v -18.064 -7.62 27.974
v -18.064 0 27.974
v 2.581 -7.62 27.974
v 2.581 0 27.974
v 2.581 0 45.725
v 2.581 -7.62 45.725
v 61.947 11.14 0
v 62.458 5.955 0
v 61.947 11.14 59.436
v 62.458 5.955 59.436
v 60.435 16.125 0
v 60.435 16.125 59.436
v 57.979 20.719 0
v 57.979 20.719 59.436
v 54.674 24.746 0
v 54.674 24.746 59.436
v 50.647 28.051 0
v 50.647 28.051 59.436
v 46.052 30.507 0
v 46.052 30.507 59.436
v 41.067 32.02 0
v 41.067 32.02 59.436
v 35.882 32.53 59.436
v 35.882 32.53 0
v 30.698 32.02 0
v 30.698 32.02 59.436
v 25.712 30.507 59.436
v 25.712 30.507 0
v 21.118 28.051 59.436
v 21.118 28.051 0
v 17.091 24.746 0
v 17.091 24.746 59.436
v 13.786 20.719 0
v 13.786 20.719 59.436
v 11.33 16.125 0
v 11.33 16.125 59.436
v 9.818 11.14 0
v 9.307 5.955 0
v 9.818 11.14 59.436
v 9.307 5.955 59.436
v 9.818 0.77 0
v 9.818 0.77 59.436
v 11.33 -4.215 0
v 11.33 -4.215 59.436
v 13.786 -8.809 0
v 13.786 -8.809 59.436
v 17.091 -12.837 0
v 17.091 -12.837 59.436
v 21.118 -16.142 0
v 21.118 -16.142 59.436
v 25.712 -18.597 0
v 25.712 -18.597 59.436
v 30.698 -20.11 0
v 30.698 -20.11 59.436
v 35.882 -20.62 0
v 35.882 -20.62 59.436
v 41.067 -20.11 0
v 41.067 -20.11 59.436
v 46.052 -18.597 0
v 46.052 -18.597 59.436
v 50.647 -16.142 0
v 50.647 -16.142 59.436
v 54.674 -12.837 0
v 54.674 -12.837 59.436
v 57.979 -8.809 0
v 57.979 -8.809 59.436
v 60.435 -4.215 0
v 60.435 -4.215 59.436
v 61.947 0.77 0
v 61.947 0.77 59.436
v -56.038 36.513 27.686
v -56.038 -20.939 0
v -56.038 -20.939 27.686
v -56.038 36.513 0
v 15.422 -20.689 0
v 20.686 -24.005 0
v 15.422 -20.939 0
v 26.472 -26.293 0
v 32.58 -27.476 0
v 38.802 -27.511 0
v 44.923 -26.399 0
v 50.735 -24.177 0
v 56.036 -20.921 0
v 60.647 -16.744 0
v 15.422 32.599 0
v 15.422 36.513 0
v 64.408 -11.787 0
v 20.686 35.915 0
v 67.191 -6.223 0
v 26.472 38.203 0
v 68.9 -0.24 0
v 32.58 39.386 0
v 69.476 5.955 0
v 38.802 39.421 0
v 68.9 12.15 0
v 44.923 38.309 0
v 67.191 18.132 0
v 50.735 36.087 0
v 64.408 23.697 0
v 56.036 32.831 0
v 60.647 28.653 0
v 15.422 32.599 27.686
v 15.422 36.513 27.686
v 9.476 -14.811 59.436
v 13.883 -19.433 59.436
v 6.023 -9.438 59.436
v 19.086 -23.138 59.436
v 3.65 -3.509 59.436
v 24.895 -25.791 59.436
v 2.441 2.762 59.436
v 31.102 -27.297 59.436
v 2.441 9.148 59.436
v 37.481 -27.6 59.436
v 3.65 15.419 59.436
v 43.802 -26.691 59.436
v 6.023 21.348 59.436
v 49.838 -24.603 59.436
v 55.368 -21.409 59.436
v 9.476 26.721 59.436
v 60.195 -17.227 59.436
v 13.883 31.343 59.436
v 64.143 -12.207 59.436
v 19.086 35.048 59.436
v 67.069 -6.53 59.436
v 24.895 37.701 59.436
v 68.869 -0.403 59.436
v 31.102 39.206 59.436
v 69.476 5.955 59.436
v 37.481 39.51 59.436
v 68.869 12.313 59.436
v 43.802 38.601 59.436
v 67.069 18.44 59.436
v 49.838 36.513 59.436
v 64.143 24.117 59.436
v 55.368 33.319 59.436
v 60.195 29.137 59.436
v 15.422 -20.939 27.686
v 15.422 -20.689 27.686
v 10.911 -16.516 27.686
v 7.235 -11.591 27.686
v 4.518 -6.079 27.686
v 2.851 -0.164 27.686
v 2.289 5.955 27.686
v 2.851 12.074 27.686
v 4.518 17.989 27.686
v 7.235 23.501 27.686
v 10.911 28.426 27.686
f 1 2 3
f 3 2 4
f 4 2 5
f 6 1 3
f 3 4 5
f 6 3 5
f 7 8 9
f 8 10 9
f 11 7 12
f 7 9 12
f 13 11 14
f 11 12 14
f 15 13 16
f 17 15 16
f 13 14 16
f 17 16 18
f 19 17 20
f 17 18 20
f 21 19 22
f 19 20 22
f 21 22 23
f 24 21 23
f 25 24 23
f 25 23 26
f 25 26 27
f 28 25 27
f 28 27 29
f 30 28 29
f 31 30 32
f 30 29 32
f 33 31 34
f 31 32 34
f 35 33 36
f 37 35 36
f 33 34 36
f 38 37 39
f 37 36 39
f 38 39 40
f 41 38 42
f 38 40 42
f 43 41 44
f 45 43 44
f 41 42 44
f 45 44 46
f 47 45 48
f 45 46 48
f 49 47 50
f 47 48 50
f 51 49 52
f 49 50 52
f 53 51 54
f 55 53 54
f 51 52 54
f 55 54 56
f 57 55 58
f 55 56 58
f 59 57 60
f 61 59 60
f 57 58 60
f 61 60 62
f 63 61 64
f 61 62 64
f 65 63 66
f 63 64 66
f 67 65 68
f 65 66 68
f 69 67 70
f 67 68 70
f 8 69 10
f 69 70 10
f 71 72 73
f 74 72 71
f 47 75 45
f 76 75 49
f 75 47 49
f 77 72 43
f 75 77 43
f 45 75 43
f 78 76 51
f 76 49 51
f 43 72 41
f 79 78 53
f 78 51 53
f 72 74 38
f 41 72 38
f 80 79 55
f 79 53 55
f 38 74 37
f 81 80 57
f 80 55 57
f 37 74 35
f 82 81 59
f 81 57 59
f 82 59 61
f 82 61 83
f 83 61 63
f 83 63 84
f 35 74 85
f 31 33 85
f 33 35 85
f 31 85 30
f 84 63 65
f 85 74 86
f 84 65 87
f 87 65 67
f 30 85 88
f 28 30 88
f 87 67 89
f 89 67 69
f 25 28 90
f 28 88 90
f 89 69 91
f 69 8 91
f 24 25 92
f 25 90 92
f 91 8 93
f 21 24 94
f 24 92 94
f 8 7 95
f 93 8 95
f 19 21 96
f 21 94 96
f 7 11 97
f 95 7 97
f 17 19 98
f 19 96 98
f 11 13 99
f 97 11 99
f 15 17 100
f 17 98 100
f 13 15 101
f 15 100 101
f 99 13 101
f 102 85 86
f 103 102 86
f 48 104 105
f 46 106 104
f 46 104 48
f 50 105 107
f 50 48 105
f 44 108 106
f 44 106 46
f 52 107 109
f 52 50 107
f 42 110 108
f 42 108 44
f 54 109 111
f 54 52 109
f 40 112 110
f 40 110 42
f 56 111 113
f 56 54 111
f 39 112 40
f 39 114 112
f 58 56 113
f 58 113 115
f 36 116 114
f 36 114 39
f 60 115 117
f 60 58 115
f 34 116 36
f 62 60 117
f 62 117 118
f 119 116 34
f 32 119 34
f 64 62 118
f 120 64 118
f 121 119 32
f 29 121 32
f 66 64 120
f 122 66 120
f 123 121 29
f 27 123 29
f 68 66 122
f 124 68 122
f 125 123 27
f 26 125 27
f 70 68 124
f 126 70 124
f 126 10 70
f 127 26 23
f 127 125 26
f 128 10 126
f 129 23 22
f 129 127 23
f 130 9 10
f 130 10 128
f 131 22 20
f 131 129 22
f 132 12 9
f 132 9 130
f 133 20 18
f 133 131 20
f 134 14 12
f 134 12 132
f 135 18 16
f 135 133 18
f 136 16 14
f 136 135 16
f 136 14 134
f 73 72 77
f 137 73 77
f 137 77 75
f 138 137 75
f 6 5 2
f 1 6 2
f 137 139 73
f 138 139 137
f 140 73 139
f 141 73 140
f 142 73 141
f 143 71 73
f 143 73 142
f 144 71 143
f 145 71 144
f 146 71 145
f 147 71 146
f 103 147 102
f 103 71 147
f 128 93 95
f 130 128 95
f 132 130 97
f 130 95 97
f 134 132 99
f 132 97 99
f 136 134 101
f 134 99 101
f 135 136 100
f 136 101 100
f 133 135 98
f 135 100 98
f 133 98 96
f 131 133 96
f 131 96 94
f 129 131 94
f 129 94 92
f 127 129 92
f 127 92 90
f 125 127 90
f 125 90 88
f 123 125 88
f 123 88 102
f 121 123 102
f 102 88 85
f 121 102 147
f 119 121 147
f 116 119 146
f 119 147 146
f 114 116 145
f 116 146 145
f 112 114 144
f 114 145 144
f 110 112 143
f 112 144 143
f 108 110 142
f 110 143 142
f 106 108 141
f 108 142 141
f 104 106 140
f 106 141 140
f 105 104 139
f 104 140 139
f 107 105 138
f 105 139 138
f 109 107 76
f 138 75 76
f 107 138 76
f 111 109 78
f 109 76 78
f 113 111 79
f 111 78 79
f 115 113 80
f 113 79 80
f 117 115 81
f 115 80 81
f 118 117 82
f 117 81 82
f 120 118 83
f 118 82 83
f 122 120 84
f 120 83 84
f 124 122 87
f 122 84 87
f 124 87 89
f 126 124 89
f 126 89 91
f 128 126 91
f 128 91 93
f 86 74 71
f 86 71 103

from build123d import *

# Parameters (mm, degrees)
F0_W     = 71.459316
F0_H     = 57.452351
F1_DEPTH = 27.686
F2_R     = 33.593377
F3_DEPTH = 59.436
F4_R     = 26.575227
F5_DEPTH = 120.396
F7_DEPTH = 7.62


with BuildPart() as f1:
    # F0 (on Top) → F1 (new body)
    with BuildSketch(Plane.XY):
        with Locations((-20.30788, 7.78723)):
            Rectangle(F0_W, F0_H)
    extrude(amount=F1_DEPTH)

    # F2 (on Top) → F3 (join)
    with BuildSketch(Plane.XY):
        with Locations((35.88235, 5.954943)):
            Circle(F2_R)
    extrude(amount=F3_DEPTH)

    # F4 (on face) → F5 (cut, symmetric)
    with BuildSketch(Plane.XY.offset(59.436)):
        with Locations((35.88235, 5.954943)):
            Circle(F4_R)
    extrude(amount=F5_DEPTH, both=True, mode=Mode.SUBTRACT)


with BuildPart() as f7:
    # F6 (on Front) → F7 (new body)
    with BuildSketch(Plane.XZ):
        Polygon((2.581278, 45.724593), (-18.064361, 27.974378), (2.581278, 27.974378), align=None)
    extrude(amount=F7_DEPTH)


solid = Compound([f1.part, f7.part])
